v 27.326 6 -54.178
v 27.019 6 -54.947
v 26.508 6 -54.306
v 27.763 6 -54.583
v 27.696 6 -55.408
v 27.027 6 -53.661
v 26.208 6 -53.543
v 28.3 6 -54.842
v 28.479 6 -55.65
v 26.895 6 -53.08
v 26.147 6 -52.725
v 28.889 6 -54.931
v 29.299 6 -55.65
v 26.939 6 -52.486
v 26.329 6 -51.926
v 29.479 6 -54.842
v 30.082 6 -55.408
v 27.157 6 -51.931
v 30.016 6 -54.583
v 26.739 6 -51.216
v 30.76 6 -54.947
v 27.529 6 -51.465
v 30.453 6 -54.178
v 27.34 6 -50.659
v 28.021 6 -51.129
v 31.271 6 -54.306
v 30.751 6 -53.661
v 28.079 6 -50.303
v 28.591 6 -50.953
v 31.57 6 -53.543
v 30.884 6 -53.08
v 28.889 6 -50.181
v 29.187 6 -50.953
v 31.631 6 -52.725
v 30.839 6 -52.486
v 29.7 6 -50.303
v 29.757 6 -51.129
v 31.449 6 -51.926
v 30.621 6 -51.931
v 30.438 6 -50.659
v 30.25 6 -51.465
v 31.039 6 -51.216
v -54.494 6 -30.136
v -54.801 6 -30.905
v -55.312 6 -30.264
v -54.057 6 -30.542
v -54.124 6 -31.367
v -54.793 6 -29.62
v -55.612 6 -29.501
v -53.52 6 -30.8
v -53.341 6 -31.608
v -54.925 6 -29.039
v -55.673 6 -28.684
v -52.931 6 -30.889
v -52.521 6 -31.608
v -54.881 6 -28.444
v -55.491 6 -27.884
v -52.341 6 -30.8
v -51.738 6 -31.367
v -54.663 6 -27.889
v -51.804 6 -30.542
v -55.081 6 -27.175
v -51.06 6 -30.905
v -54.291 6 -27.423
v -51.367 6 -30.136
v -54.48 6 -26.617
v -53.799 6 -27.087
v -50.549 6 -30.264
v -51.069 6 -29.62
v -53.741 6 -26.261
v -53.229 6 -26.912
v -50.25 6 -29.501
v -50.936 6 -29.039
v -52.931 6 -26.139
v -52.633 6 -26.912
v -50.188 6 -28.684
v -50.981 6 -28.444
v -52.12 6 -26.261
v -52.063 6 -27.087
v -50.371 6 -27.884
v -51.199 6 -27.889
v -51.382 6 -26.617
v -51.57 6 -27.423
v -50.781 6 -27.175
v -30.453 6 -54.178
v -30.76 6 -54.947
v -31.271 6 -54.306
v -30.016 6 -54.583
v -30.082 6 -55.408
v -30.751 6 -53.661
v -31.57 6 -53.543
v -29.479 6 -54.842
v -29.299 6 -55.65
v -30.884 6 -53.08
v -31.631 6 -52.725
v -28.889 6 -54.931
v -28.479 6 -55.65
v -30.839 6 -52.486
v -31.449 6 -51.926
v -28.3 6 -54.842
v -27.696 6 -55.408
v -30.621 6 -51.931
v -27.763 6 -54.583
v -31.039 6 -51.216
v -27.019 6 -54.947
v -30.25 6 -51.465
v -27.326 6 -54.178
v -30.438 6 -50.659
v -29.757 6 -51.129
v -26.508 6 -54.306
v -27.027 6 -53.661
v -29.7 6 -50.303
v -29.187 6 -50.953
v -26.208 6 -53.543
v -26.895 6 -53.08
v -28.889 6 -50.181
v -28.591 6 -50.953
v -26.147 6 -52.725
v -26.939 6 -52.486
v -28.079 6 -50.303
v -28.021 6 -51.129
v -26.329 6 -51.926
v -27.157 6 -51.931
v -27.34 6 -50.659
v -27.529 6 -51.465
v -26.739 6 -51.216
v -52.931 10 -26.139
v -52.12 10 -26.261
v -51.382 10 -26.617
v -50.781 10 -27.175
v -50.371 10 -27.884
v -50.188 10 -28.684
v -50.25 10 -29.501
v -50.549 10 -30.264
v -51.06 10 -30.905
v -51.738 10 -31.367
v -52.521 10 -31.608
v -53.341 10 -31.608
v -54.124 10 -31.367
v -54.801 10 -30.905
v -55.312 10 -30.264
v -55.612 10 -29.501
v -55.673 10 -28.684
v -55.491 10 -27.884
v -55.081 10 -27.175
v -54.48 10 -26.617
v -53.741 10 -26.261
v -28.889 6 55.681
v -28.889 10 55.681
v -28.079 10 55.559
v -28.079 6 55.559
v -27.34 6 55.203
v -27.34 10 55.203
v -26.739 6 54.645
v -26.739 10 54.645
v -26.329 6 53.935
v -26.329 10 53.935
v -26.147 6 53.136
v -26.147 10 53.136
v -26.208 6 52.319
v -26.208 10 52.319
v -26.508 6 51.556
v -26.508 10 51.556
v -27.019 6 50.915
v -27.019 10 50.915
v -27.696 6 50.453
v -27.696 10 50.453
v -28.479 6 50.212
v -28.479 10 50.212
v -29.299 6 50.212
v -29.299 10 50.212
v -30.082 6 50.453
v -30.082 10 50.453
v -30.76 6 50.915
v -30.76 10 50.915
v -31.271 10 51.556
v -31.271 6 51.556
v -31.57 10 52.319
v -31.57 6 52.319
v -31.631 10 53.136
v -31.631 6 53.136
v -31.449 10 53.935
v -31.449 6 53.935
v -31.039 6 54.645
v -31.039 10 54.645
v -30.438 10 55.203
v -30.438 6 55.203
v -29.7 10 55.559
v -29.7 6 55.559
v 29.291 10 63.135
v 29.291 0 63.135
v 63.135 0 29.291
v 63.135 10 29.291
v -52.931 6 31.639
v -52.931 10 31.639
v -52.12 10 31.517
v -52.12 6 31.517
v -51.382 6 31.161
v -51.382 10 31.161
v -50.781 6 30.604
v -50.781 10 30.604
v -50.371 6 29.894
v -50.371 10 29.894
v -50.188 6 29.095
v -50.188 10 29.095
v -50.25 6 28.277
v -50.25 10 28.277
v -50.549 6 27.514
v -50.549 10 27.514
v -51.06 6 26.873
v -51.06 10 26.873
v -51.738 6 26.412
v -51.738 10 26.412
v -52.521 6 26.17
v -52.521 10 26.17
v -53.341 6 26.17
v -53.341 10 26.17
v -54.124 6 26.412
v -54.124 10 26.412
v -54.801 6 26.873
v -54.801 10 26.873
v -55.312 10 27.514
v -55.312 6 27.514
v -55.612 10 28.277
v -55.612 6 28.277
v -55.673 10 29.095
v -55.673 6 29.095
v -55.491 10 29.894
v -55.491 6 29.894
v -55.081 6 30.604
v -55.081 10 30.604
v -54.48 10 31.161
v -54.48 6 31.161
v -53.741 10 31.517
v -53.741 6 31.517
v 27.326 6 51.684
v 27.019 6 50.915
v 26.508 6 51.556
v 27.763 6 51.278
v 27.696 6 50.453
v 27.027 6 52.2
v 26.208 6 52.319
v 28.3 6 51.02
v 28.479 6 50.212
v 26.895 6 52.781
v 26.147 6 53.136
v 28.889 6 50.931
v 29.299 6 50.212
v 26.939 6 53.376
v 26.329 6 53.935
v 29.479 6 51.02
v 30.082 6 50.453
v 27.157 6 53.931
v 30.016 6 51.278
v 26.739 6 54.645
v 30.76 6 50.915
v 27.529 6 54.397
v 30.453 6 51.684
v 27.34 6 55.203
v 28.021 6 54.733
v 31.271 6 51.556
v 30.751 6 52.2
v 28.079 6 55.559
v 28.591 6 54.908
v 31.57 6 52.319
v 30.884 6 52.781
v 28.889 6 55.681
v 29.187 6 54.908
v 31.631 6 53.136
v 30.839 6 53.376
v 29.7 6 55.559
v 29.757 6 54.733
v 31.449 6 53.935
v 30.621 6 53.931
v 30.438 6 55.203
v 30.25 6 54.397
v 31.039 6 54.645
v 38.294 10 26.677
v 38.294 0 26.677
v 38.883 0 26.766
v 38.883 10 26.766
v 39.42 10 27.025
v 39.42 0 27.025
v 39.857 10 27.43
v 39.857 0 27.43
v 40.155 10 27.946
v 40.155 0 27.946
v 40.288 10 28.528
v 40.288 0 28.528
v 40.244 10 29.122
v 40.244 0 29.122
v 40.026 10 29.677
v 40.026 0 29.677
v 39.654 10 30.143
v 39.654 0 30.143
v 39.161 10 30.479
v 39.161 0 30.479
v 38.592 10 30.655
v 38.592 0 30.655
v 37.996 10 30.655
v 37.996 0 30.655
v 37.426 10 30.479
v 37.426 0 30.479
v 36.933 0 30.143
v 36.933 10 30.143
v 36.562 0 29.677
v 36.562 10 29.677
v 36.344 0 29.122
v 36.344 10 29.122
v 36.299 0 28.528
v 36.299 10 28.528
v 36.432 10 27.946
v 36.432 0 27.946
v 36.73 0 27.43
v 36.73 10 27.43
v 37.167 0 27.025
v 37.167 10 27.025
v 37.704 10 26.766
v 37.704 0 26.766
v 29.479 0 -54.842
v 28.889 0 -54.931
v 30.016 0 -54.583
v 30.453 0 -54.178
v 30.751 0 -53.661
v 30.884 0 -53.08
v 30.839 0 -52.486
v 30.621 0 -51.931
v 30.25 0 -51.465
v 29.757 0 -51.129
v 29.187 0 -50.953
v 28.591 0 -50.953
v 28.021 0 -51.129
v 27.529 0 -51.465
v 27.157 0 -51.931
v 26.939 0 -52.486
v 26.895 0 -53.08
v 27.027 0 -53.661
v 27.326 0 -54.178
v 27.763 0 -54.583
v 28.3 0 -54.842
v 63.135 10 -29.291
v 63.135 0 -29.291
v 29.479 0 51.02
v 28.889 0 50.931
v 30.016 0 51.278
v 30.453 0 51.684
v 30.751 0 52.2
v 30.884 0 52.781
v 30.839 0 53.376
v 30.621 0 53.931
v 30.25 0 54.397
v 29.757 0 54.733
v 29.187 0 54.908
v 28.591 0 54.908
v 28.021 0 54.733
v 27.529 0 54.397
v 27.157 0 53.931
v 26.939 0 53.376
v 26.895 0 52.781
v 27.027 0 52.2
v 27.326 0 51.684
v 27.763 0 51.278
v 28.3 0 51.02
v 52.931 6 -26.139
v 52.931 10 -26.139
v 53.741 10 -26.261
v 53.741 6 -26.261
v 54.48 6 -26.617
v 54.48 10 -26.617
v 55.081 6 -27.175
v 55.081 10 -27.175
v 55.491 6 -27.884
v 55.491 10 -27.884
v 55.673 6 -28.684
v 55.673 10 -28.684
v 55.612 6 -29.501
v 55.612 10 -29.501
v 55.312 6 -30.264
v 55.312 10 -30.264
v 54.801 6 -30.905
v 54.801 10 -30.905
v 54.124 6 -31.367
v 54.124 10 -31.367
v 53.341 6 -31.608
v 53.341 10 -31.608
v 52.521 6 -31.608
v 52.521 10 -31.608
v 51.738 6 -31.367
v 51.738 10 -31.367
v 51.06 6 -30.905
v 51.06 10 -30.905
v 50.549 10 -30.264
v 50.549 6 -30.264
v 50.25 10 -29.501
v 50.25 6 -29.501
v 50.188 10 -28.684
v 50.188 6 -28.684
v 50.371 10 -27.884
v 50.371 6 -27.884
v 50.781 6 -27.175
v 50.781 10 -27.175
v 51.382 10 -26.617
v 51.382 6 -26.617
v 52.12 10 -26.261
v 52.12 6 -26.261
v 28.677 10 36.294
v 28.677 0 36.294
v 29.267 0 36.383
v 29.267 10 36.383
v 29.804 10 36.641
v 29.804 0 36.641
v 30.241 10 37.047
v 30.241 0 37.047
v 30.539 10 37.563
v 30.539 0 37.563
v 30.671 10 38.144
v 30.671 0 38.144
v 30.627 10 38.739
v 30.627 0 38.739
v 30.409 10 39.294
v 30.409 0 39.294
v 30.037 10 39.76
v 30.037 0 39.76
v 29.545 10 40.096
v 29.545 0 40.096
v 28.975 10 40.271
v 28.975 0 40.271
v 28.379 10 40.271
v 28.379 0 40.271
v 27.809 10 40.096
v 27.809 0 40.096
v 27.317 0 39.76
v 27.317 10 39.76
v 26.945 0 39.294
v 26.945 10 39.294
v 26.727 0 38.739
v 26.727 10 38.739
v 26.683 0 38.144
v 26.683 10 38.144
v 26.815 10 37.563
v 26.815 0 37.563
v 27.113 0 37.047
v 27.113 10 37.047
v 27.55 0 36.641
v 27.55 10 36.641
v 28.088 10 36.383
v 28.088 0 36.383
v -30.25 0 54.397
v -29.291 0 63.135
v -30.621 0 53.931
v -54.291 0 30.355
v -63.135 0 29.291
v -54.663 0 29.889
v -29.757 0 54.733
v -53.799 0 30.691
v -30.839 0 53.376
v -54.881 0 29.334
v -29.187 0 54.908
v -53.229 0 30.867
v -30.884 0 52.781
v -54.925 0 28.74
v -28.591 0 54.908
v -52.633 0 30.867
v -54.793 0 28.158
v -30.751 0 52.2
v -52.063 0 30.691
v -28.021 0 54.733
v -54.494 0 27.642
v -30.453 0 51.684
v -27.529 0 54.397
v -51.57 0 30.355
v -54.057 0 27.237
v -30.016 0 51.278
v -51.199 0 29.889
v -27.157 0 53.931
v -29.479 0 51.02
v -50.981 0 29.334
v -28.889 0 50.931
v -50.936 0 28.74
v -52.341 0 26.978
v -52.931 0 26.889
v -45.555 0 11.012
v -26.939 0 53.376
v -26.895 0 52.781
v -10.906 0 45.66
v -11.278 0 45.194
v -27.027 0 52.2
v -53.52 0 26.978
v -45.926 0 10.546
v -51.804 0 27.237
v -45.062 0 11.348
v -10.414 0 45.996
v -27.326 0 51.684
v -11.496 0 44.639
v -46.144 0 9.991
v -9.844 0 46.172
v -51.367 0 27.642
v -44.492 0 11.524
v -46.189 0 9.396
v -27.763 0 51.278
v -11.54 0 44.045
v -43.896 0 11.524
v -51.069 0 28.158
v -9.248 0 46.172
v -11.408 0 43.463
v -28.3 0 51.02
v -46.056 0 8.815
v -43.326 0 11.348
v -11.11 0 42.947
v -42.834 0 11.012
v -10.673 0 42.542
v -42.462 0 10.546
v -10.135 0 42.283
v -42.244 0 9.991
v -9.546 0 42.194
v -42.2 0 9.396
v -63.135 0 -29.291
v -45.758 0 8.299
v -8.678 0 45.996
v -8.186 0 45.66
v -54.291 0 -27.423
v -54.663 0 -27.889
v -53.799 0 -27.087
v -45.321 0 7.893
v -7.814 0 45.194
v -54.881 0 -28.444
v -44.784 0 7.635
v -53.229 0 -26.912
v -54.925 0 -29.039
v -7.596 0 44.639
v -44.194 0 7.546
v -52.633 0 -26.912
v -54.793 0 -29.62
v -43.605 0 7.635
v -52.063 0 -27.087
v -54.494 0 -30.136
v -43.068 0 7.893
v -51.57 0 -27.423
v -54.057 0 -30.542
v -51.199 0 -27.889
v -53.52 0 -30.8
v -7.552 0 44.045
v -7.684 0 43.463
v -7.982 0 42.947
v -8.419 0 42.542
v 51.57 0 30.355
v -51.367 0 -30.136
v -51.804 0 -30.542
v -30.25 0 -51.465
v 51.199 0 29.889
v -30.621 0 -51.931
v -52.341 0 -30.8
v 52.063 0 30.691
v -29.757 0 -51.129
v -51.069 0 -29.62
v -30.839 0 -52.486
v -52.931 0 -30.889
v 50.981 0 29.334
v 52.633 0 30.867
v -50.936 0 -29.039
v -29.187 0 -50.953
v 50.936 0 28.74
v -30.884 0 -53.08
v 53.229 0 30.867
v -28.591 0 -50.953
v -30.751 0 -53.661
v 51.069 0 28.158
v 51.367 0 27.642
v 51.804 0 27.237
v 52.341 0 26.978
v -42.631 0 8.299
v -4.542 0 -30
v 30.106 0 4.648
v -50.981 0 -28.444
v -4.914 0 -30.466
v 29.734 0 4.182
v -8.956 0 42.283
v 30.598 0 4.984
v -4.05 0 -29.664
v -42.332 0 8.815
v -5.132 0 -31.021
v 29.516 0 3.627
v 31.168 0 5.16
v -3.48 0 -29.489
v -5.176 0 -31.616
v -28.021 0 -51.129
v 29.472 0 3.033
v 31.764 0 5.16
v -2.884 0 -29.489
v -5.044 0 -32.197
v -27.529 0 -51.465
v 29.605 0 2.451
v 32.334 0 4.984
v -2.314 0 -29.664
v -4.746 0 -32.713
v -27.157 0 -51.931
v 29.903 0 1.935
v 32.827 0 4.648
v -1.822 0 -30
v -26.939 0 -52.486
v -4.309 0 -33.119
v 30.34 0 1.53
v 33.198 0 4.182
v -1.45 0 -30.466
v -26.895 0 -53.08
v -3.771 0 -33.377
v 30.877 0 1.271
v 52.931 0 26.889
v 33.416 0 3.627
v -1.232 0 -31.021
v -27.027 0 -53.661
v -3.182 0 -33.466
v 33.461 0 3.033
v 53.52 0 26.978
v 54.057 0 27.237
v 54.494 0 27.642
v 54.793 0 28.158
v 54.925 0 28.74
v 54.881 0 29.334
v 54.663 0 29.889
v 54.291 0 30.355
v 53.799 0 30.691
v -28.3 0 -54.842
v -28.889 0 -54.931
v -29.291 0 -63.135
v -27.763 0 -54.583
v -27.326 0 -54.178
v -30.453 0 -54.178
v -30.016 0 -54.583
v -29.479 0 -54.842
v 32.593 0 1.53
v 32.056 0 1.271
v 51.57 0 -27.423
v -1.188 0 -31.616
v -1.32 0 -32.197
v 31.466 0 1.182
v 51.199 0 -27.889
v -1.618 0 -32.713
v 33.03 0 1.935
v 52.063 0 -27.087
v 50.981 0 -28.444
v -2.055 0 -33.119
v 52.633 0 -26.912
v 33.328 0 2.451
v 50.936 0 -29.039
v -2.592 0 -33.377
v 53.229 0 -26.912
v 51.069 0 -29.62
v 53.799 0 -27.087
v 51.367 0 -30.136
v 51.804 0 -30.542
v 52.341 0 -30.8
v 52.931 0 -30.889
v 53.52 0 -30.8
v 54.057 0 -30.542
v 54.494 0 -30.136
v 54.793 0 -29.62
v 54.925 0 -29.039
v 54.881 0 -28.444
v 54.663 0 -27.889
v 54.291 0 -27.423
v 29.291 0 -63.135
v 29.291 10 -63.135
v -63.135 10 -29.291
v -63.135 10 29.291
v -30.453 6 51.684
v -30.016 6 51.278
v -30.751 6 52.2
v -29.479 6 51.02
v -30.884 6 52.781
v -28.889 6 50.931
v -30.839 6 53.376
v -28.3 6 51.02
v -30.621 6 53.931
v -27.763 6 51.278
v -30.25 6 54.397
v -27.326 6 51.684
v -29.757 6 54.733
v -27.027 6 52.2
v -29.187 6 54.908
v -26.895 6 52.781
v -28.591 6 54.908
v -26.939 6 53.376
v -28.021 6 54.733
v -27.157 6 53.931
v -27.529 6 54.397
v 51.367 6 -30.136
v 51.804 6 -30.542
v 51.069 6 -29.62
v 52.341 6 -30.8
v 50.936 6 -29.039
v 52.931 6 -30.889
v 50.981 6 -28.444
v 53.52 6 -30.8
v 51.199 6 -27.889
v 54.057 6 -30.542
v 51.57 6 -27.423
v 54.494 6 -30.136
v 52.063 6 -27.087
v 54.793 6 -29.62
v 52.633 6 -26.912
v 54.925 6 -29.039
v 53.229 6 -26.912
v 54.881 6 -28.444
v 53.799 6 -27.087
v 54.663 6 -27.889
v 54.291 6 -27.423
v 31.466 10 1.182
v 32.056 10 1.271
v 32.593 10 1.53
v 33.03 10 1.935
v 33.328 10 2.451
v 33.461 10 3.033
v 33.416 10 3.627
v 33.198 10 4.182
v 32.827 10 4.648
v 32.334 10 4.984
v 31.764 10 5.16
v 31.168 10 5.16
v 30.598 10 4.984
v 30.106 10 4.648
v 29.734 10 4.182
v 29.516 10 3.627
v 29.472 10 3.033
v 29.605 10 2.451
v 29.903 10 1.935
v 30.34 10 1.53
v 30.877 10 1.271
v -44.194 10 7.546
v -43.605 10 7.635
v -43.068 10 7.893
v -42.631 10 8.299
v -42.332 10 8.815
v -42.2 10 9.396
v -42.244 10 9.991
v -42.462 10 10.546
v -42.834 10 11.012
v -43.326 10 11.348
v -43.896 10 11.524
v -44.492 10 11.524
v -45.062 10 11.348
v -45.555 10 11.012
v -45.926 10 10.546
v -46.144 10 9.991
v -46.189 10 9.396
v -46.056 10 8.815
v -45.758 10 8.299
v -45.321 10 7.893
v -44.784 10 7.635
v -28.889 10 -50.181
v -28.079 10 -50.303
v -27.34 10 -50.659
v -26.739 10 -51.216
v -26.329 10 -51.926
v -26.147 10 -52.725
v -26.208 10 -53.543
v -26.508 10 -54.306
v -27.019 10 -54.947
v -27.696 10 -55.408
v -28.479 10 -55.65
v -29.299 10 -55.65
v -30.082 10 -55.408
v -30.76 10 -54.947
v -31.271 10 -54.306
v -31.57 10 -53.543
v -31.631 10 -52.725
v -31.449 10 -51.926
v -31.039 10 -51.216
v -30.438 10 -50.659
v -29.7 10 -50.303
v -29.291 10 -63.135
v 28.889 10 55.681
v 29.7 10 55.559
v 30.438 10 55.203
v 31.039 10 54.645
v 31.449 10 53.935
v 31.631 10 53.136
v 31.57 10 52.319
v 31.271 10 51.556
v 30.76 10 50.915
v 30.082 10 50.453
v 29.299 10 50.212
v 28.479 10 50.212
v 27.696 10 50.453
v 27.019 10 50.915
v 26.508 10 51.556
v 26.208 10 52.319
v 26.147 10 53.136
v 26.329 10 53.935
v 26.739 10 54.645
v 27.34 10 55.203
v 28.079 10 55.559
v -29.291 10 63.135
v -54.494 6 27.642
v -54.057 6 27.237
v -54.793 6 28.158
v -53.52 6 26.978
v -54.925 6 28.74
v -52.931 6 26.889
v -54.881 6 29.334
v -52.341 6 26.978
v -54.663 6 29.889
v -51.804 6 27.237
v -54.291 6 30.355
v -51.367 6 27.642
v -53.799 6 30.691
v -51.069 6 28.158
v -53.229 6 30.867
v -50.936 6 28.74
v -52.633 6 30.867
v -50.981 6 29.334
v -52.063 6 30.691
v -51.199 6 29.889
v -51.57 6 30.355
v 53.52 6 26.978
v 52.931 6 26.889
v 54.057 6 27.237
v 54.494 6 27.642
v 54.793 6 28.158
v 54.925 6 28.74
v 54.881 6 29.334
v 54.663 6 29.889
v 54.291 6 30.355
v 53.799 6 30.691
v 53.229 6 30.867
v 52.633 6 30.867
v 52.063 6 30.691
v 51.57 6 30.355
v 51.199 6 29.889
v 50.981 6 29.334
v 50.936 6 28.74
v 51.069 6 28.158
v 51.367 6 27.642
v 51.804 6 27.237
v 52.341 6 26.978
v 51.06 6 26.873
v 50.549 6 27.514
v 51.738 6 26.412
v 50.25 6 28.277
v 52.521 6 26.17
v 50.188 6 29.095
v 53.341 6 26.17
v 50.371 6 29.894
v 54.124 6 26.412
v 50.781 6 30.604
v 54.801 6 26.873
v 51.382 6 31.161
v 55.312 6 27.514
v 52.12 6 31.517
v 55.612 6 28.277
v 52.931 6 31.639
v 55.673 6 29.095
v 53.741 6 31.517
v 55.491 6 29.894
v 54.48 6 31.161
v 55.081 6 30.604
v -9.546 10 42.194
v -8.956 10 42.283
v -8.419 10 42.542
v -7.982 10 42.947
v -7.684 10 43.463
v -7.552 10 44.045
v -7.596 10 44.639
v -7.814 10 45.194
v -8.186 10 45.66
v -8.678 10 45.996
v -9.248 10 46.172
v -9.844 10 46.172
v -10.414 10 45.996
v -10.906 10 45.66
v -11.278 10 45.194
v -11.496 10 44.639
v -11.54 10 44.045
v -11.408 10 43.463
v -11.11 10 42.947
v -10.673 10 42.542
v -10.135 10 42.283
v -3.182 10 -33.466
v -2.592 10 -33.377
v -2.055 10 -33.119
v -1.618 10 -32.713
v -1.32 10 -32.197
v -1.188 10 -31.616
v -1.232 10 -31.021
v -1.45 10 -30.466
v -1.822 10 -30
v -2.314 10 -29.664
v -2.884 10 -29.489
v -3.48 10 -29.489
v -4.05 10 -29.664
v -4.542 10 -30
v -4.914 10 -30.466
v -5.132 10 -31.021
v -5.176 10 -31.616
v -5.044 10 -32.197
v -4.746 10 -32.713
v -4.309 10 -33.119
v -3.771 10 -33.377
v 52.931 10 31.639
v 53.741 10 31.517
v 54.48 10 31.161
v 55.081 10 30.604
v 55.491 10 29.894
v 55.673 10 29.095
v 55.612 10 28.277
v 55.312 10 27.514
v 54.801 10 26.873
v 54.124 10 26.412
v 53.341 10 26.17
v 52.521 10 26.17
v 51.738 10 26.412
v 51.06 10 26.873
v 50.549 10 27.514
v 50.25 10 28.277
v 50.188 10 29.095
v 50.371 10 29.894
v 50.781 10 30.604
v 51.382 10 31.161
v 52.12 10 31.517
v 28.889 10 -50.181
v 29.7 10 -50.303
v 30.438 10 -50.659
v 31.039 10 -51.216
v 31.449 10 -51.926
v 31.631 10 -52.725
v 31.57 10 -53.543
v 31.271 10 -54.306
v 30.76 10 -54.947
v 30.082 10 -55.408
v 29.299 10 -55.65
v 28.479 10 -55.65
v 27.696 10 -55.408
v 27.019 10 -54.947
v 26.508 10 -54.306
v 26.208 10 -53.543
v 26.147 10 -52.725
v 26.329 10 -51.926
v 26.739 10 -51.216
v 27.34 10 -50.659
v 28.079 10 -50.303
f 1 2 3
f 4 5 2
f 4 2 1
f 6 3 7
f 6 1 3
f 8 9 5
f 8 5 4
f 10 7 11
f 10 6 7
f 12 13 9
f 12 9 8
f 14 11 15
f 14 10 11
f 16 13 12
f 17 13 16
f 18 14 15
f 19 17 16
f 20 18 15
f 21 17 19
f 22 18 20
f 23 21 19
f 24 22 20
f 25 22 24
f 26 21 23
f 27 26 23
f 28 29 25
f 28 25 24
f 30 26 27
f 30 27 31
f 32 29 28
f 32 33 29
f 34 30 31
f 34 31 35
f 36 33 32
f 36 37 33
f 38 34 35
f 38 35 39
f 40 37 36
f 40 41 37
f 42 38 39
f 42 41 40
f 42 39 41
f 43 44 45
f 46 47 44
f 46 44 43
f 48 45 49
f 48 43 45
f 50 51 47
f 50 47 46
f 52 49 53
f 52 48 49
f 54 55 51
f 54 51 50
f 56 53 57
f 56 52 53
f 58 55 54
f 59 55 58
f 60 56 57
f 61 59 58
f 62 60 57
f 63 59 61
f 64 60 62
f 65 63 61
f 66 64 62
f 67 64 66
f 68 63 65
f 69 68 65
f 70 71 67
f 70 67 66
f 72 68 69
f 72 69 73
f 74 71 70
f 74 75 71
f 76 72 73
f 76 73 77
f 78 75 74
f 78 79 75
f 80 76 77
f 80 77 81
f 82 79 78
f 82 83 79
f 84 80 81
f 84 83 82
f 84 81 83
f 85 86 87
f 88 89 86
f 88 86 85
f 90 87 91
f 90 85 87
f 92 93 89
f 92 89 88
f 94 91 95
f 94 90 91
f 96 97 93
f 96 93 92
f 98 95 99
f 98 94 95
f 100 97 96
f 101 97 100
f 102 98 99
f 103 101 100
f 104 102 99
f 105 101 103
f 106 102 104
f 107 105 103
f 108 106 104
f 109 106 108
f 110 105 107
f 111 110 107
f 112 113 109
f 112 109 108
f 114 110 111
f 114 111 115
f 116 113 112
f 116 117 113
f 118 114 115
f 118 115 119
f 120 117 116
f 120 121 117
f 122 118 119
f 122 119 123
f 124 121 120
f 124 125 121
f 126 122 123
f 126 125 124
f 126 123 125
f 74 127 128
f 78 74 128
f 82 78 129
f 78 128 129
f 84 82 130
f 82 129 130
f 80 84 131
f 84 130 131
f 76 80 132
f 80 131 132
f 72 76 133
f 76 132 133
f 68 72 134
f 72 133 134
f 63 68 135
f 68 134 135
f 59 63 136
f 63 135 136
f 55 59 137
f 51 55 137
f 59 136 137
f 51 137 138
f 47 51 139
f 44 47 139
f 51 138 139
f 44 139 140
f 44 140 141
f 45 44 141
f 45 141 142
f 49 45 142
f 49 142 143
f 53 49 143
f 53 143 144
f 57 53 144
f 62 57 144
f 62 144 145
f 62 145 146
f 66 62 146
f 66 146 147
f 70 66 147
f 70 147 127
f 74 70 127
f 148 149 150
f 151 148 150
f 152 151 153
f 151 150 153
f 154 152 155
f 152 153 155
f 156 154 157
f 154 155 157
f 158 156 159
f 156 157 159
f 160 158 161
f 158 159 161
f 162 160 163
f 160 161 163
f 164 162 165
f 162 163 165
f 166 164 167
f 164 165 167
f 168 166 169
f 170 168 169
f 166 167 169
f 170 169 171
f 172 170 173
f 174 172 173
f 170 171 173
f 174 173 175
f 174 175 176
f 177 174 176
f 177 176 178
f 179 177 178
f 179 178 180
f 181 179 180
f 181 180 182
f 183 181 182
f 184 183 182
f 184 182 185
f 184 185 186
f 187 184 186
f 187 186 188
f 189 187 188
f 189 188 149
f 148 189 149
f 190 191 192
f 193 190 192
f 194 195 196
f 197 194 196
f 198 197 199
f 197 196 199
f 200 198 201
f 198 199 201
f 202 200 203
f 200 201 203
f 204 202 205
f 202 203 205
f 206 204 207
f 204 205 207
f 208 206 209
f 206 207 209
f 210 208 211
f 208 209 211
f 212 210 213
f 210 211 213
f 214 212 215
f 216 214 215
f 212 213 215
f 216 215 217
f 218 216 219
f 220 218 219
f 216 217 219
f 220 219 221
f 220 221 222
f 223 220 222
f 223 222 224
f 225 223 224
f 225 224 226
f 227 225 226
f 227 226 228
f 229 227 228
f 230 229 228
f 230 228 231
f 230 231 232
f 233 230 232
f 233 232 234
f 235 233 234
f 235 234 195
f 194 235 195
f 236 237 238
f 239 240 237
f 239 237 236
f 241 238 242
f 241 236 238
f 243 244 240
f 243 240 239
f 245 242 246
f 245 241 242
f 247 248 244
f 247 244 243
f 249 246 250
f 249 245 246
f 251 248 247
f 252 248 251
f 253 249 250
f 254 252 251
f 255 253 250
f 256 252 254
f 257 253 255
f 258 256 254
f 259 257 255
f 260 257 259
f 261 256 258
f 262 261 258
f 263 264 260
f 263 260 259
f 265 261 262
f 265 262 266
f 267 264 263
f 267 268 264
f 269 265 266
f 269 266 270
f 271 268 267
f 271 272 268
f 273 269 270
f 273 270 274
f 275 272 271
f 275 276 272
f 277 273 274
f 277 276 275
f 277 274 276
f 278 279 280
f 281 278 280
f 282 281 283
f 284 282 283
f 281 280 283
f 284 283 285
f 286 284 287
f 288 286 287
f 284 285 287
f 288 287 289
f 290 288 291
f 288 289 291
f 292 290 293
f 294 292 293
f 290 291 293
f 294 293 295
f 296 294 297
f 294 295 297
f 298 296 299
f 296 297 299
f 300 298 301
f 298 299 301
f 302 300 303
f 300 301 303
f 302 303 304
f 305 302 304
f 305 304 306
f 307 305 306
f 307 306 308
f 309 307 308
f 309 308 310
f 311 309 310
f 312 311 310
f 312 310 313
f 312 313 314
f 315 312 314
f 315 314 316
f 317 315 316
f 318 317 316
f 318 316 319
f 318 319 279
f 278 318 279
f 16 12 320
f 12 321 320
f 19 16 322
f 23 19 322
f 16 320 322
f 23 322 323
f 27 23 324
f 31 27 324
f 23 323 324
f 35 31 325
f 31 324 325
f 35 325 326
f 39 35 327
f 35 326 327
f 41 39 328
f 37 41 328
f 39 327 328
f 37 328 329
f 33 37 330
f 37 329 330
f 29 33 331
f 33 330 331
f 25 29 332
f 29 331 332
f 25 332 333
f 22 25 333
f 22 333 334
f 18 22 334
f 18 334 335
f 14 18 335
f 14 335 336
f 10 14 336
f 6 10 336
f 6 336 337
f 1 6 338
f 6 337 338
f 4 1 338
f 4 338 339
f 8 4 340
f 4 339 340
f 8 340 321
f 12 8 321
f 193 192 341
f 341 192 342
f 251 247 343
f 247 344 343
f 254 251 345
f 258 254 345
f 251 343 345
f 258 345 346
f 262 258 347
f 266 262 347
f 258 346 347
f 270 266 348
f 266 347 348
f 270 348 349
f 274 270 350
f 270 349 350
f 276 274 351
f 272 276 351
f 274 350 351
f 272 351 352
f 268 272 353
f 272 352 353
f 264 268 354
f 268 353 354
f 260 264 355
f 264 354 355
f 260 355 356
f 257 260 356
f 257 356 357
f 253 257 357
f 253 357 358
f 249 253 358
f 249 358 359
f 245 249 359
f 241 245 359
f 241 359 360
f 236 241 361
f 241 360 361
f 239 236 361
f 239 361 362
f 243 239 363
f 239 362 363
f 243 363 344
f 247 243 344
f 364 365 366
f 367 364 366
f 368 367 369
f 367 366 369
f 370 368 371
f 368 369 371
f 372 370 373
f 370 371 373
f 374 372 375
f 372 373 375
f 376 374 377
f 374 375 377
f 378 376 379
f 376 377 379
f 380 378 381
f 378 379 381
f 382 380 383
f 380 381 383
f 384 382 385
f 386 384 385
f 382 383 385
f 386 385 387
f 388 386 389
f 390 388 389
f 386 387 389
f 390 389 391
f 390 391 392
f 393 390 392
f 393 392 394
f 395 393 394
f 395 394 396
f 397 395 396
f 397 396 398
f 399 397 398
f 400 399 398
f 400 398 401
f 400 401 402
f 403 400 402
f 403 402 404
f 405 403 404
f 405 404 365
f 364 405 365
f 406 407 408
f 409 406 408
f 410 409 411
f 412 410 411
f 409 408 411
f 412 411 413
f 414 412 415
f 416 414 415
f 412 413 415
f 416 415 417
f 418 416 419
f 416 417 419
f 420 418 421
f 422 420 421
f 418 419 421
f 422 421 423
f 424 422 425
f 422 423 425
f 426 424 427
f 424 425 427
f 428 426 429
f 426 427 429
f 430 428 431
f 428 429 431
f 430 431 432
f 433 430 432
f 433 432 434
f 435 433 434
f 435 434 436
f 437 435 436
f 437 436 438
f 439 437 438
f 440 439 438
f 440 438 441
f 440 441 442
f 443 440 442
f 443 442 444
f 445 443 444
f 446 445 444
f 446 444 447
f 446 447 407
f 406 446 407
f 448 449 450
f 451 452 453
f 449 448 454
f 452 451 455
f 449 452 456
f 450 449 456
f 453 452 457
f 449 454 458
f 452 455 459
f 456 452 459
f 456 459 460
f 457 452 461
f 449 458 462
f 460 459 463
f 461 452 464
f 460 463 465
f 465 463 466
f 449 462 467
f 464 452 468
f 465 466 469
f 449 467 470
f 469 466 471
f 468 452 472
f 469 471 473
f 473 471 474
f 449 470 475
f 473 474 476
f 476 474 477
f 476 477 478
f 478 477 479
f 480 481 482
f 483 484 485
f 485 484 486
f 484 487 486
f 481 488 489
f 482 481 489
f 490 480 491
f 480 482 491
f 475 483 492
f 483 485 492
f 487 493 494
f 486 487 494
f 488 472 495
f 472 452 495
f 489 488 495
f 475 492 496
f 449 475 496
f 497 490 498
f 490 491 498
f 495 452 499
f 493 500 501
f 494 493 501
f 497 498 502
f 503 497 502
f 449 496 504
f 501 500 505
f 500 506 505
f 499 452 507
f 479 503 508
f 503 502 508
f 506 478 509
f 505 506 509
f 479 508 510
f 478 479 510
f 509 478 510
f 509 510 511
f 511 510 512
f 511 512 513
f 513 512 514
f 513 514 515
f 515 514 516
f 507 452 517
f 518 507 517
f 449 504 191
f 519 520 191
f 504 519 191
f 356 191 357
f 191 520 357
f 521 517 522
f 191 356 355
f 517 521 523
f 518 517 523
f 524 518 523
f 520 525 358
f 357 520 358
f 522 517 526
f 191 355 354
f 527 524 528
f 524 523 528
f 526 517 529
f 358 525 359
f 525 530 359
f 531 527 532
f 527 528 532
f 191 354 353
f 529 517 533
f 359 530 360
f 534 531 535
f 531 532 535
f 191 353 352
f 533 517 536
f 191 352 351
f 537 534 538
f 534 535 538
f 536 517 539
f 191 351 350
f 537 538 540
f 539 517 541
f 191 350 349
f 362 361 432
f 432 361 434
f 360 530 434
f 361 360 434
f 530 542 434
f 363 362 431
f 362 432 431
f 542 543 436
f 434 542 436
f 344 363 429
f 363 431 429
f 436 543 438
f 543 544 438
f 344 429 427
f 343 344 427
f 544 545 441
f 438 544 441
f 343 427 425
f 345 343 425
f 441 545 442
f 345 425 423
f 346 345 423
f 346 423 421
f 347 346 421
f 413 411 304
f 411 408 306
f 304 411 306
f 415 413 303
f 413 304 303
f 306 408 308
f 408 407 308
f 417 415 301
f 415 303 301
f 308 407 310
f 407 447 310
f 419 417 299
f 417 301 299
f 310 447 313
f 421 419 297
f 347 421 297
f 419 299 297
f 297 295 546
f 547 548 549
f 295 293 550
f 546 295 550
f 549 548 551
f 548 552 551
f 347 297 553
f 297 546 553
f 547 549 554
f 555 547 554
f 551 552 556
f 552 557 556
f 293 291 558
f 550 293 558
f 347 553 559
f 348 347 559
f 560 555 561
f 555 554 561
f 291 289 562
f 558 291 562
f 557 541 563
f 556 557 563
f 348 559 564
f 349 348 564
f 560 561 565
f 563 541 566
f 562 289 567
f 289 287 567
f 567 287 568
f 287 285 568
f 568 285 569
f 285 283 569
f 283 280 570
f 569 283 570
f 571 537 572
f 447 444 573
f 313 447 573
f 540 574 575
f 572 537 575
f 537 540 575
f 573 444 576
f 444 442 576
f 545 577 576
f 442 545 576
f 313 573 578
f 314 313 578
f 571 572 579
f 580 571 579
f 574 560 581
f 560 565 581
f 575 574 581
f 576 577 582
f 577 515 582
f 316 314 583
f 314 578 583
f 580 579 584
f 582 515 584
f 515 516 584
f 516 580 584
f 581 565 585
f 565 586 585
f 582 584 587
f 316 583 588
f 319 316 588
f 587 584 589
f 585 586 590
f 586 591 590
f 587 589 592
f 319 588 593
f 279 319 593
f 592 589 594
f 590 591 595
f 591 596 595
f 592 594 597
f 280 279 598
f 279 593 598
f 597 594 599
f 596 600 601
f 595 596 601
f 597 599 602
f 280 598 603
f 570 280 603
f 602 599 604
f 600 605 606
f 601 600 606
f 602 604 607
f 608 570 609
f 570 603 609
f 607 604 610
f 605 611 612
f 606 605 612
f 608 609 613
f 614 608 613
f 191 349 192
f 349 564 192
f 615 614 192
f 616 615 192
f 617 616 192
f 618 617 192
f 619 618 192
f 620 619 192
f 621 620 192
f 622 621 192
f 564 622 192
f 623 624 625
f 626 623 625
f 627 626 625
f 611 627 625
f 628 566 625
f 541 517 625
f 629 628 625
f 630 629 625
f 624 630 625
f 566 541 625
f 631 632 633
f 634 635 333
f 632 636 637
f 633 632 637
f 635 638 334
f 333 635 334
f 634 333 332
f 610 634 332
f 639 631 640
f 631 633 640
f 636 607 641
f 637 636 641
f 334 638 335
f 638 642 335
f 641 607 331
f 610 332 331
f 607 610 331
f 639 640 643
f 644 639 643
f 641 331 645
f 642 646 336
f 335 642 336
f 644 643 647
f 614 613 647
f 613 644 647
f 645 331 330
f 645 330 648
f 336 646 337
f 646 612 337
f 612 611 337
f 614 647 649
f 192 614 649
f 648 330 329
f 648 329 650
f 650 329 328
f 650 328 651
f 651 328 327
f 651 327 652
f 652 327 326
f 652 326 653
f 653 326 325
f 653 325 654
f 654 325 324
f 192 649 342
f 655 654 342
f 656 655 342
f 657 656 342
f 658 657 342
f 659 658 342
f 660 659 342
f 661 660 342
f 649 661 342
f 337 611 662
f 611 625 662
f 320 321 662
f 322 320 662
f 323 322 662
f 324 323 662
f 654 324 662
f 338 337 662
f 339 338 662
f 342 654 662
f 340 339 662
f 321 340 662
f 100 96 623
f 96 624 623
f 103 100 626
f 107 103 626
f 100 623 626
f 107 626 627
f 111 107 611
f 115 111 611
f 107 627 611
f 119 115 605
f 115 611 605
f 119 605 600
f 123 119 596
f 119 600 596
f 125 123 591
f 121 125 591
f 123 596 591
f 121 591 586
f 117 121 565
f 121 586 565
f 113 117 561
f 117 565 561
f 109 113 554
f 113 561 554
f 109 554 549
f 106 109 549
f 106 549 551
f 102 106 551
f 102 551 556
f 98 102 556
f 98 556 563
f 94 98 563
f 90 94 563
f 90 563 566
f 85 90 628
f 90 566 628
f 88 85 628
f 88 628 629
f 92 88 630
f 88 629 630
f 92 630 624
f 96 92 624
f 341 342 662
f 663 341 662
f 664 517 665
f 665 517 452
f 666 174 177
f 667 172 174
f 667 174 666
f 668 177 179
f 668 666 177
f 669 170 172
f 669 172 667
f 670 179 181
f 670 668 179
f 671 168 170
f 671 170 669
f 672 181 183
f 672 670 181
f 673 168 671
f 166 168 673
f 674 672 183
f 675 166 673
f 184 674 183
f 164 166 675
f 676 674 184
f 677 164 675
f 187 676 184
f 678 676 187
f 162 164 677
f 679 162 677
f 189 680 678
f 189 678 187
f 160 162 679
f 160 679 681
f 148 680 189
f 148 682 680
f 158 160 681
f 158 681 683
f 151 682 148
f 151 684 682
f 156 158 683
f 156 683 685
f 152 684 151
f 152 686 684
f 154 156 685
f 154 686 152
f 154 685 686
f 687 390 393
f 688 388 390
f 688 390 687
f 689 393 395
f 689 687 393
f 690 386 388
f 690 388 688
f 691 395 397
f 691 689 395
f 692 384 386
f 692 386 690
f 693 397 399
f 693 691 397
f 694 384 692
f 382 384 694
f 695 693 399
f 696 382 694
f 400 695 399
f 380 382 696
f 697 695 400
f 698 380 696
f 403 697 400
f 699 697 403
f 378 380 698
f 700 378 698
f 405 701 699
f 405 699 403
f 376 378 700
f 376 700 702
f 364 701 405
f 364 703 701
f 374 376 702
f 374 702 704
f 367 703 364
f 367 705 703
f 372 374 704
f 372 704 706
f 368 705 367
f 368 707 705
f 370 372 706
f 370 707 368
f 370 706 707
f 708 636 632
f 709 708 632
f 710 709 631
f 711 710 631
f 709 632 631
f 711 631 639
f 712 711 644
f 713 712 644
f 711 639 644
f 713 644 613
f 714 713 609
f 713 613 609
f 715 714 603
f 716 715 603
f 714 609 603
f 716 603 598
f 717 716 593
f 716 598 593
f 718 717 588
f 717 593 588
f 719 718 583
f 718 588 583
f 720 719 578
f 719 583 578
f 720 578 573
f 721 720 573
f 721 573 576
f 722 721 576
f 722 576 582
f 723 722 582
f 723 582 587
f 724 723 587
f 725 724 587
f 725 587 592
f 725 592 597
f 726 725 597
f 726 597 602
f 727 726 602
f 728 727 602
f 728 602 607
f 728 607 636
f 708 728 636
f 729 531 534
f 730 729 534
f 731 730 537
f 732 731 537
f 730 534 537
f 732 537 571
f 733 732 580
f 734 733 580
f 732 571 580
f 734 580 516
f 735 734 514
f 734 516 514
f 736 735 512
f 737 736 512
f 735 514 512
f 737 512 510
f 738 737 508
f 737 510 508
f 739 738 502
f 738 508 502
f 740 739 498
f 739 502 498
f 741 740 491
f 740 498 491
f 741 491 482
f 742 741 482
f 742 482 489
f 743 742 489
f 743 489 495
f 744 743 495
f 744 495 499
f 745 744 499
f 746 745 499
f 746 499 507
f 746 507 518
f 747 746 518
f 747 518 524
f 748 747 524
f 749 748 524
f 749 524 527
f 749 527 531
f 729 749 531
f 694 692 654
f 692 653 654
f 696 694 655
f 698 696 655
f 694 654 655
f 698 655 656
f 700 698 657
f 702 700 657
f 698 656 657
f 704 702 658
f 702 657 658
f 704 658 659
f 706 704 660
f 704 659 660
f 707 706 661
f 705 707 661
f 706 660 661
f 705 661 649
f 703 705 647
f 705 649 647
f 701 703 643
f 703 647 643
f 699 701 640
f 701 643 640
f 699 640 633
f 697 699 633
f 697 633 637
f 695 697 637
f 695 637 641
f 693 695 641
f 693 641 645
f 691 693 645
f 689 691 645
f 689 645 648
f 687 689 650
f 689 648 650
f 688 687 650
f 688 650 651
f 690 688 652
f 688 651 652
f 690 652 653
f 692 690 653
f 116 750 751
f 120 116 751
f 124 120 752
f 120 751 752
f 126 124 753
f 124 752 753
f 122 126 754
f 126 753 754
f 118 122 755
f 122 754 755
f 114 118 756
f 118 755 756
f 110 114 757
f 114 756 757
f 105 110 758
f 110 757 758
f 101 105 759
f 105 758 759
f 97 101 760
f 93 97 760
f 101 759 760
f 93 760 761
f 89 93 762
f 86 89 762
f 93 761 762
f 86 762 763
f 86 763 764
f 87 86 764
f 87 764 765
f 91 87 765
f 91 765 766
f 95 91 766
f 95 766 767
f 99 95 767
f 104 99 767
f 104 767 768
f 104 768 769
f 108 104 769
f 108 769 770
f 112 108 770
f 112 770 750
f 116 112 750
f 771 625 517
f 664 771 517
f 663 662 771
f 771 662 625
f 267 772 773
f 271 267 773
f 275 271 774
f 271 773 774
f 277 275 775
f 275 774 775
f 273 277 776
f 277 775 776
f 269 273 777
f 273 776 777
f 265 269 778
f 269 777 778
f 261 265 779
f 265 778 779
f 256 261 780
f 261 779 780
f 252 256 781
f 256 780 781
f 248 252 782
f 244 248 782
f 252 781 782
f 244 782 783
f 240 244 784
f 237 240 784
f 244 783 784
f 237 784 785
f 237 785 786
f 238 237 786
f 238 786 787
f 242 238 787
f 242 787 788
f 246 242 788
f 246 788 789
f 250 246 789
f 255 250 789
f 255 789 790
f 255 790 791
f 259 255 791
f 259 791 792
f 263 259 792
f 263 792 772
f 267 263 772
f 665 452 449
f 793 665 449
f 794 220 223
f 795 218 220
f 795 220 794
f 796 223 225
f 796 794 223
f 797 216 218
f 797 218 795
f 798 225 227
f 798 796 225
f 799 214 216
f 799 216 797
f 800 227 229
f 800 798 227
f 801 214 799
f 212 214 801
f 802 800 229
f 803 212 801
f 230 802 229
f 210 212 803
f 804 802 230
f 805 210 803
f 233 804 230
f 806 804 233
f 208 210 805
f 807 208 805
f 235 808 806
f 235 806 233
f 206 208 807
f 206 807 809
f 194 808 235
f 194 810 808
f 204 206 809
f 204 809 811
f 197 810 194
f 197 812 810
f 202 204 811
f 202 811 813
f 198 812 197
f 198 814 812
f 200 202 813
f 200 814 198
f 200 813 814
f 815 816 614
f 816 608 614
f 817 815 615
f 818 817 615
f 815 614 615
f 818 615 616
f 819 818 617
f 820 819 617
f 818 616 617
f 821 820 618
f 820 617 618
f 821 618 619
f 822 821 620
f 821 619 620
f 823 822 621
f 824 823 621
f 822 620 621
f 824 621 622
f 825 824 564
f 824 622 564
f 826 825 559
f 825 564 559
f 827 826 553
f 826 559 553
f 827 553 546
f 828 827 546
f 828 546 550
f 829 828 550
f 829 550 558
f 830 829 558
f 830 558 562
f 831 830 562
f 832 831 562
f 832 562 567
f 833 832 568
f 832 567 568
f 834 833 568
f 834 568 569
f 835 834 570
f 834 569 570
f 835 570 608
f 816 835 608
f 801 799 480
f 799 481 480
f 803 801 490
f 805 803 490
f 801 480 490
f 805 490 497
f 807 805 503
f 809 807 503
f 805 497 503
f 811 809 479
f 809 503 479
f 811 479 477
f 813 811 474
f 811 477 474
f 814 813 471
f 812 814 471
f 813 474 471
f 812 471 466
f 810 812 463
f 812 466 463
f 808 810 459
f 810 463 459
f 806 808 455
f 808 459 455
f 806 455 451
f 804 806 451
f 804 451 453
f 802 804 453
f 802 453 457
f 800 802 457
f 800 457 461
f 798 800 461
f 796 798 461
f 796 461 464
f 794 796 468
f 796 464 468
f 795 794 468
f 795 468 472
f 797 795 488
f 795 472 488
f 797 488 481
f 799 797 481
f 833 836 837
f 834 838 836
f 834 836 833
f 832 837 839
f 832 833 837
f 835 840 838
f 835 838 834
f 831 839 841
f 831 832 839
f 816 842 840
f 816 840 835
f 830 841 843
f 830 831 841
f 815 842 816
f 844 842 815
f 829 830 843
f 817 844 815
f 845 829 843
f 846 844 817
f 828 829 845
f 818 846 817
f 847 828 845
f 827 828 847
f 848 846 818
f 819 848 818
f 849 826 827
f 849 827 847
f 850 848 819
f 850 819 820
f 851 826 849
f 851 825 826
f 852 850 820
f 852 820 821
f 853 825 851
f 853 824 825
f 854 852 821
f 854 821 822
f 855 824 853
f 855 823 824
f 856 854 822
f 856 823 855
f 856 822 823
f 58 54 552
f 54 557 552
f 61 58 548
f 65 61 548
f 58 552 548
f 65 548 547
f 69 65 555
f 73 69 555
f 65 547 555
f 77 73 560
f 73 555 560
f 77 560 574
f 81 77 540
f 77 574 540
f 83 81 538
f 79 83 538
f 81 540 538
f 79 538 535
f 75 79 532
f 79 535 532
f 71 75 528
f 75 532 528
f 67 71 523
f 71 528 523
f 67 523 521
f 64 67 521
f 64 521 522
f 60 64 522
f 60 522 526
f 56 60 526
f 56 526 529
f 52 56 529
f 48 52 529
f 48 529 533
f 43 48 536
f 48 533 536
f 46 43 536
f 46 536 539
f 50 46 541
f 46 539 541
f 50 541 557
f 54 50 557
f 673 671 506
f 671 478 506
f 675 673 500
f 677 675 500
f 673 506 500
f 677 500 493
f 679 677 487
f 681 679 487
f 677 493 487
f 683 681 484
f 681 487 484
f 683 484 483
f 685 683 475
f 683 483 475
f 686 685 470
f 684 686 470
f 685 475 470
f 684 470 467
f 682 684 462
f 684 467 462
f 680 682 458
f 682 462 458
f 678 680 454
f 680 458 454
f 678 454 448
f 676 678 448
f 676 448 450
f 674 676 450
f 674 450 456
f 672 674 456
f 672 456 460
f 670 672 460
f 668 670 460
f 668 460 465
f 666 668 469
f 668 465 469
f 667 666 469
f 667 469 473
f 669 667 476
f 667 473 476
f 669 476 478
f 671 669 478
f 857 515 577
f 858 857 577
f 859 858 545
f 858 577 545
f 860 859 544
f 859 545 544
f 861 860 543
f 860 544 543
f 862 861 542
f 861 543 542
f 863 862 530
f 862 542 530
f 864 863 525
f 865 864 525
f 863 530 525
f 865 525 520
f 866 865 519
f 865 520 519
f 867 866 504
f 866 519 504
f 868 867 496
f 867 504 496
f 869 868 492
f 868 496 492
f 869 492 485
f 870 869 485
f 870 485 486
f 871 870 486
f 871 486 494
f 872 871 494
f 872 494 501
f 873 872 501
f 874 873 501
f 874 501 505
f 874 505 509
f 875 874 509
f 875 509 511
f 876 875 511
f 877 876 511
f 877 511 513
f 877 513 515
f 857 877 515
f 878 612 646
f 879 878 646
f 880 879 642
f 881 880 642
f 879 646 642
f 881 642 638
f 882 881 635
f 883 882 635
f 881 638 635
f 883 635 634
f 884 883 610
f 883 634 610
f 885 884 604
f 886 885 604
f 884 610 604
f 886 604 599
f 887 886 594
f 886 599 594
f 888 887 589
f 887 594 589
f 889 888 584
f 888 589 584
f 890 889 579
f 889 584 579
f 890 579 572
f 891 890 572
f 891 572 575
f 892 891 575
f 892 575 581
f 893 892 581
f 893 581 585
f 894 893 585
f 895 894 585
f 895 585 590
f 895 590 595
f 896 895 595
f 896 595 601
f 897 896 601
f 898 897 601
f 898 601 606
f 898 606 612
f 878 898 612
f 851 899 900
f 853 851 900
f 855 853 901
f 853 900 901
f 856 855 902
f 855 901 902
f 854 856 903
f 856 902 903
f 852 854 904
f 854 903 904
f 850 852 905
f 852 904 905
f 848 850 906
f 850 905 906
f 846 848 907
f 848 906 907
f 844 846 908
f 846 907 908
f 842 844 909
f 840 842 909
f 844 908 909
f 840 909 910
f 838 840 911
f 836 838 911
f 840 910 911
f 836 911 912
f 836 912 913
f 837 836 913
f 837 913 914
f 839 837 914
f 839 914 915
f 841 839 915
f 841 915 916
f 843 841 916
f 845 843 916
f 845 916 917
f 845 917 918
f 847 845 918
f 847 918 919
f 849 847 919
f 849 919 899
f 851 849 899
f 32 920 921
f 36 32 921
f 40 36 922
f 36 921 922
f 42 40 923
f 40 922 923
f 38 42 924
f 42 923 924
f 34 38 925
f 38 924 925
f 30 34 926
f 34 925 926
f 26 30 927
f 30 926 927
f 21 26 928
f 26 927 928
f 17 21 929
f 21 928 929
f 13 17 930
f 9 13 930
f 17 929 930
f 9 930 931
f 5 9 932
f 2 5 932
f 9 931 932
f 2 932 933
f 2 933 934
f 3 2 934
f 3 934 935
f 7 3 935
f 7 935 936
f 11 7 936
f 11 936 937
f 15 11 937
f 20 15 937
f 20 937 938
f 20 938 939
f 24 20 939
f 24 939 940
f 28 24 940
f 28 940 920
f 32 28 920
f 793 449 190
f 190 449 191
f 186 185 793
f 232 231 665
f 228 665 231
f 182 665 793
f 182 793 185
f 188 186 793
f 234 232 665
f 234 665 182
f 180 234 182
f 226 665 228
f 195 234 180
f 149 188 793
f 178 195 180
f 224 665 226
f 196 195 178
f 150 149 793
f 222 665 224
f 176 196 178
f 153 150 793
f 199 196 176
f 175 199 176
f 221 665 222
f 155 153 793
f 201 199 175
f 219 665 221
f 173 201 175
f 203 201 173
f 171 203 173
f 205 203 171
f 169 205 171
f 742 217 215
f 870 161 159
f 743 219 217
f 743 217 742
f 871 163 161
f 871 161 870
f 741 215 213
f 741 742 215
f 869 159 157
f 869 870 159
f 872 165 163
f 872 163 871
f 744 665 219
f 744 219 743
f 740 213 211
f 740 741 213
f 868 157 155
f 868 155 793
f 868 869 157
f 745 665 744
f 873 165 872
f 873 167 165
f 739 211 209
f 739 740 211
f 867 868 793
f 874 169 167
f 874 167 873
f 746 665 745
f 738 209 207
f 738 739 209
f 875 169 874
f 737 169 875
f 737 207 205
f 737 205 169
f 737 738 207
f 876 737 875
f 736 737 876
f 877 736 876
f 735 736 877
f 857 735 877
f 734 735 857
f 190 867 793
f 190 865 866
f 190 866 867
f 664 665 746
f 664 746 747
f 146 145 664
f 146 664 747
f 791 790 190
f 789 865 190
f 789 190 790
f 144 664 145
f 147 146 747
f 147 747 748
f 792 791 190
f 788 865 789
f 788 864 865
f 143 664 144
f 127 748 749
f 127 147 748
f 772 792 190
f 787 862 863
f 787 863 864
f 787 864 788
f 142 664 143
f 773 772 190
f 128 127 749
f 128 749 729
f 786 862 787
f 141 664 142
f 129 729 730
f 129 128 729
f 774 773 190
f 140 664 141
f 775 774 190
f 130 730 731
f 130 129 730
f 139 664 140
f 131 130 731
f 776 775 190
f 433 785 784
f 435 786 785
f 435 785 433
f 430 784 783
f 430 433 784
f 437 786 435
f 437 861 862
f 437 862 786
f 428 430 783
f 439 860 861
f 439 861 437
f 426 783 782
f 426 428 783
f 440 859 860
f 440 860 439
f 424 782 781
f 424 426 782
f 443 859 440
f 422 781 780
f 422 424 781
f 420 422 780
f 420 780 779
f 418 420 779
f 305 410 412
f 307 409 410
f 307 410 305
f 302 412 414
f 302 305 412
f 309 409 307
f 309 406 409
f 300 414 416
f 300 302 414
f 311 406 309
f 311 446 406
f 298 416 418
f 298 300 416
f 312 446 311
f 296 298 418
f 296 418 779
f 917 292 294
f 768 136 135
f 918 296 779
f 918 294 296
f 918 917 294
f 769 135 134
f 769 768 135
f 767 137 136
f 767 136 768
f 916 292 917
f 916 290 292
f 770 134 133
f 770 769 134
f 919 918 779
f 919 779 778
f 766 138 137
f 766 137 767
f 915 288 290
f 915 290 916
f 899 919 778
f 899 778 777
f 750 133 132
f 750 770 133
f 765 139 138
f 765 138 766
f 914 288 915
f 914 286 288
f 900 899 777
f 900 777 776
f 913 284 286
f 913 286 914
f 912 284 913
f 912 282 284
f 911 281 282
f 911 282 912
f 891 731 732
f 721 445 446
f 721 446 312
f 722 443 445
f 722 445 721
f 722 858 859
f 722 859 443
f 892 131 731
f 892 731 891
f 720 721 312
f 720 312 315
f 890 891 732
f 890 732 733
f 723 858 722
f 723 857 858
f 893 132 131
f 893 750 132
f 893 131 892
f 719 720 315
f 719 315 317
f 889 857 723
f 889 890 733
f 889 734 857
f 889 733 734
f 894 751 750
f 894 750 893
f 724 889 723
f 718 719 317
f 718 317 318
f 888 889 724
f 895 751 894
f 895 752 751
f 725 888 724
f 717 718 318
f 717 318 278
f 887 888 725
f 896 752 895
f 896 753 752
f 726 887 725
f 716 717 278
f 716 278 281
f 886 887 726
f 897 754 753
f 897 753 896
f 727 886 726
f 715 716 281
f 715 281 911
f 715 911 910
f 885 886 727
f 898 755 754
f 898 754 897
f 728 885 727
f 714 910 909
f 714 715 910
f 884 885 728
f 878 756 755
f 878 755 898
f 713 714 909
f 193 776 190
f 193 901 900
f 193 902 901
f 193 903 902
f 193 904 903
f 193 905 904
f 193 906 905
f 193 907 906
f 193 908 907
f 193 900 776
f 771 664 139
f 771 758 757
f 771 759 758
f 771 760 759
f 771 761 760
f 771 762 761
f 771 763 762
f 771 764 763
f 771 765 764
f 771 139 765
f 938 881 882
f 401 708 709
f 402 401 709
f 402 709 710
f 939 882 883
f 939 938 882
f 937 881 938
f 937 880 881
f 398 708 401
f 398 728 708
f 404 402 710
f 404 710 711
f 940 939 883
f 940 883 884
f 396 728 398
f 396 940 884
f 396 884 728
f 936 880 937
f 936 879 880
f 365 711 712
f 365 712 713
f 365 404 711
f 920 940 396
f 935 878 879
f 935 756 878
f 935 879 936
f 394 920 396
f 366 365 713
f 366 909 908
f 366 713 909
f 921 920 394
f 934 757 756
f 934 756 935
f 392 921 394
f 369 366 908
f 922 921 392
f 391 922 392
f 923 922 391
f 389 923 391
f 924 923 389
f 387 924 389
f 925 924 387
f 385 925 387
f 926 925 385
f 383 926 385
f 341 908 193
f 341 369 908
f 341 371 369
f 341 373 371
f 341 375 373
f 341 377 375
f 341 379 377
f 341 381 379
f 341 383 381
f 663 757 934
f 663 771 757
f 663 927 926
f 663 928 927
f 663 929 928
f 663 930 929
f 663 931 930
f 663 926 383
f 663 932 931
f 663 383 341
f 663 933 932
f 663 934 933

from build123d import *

# Parameters (mm, degrees)
BOSS_EXTRU_1_DEPTH                                   = 10
CHAMBRAGE_POUR_T_TE_CYLINDRIQUE_FENDUE_M_D           = 4
CHAMBRAGE_POUR_T_TE_CYLINDRIQUE_FENDUE_M_CBORE_D     = 5.5
CHAMBRAGE_POUR_T_TE_CYLINDRIQUE_FENDUE_M_CBORE_DEPTH = 4
ESQUISSE6_R                                          = 2
ENL_V_MAT_EXTRU_1_DEPTH                              = 90.844829046


with BuildPart() as part:
    # Esquisse1 → Boss.-Extru.1 (new body)
    with BuildSketch(Plane(origin=(0, 0, 0), x_dir=(1, 0, 0), z_dir=(0, 1, 0))):
        Polygon((63.135145942, -29.291431628), (63.135145942, 29.291431628), (29.291431628, 63.135145942), (-29.291431628, 63.135145942), (-63.135145942, 29.291431628), (-63.135145942, -29.291431628), (-29.291431628, -63.135145942), (29.291431628, -63.135145942), align=None)
    extrude(amount=BOSS_EXTRU_1_DEPTH)

    # Chambrage pour tête cylindrique fendue M31 (through all)
    with Locations(Plane(origin=(-28.889172646, 10, -52.930803206), x_dir=(0, 0, 1), z_dir=(0, 1, 0))):
        with Locations((0, 0), (24.04163056, -24.04163056), (81.819975852, -24.04163056), (105.861606412, 0), (105.861606412, 57.778345292), (81.819975852, 81.819975852), (24.04163056, 81.819975852), (0, 57.778345292)):
            CounterBoreHole(CHAMBRAGE_POUR_T_TE_CYLINDRIQUE_FENDUE_M_D / 2, CHAMBRAGE_POUR_T_TE_CYLINDRIQUE_FENDUE_M_CBORE_D / 2, CHAMBRAGE_POUR_T_TE_CYLINDRIQUE_FENDUE_M_CBORE_DEPTH)

    # Esquisse6 → Enlèv. mat.-Extru.1 (cut, through all)
    with BuildSketch(Plane.XZ):
        with Locations(Location((-44.194173824, 9.545941546, 0), (0, 0, 270))):
            Circle(ESQUISSE6_R)
        with Locations(Location((-9.545941546, 44.194173824, 0), (0, 0, 270))):
            Circle(ESQUISSE6_R)
        with Locations(Location((-3.181980515, -31.466251763, 0), (0, 0, 270))):
            Circle(ESQUISSE6_R)
        with Locations(Location((31.466251763, 3.181980515, 0), (0, 0, 270))):
            Circle(ESQUISSE6_R)
        with Locations(Location((28.677040611, 38.293692836, 0), (0, 0, 270))):
            Circle(ESQUISSE6_R)
        with Locations(Location((38.293692836, 28.677040611, 0), (0, 0, 270))):
            Circle(ESQUISSE6_R)
    extrude(amount=-ENL_V_MAT_EXTRU_1_DEPTH, mode=Mode.SUBTRACT)


solid = part.part
